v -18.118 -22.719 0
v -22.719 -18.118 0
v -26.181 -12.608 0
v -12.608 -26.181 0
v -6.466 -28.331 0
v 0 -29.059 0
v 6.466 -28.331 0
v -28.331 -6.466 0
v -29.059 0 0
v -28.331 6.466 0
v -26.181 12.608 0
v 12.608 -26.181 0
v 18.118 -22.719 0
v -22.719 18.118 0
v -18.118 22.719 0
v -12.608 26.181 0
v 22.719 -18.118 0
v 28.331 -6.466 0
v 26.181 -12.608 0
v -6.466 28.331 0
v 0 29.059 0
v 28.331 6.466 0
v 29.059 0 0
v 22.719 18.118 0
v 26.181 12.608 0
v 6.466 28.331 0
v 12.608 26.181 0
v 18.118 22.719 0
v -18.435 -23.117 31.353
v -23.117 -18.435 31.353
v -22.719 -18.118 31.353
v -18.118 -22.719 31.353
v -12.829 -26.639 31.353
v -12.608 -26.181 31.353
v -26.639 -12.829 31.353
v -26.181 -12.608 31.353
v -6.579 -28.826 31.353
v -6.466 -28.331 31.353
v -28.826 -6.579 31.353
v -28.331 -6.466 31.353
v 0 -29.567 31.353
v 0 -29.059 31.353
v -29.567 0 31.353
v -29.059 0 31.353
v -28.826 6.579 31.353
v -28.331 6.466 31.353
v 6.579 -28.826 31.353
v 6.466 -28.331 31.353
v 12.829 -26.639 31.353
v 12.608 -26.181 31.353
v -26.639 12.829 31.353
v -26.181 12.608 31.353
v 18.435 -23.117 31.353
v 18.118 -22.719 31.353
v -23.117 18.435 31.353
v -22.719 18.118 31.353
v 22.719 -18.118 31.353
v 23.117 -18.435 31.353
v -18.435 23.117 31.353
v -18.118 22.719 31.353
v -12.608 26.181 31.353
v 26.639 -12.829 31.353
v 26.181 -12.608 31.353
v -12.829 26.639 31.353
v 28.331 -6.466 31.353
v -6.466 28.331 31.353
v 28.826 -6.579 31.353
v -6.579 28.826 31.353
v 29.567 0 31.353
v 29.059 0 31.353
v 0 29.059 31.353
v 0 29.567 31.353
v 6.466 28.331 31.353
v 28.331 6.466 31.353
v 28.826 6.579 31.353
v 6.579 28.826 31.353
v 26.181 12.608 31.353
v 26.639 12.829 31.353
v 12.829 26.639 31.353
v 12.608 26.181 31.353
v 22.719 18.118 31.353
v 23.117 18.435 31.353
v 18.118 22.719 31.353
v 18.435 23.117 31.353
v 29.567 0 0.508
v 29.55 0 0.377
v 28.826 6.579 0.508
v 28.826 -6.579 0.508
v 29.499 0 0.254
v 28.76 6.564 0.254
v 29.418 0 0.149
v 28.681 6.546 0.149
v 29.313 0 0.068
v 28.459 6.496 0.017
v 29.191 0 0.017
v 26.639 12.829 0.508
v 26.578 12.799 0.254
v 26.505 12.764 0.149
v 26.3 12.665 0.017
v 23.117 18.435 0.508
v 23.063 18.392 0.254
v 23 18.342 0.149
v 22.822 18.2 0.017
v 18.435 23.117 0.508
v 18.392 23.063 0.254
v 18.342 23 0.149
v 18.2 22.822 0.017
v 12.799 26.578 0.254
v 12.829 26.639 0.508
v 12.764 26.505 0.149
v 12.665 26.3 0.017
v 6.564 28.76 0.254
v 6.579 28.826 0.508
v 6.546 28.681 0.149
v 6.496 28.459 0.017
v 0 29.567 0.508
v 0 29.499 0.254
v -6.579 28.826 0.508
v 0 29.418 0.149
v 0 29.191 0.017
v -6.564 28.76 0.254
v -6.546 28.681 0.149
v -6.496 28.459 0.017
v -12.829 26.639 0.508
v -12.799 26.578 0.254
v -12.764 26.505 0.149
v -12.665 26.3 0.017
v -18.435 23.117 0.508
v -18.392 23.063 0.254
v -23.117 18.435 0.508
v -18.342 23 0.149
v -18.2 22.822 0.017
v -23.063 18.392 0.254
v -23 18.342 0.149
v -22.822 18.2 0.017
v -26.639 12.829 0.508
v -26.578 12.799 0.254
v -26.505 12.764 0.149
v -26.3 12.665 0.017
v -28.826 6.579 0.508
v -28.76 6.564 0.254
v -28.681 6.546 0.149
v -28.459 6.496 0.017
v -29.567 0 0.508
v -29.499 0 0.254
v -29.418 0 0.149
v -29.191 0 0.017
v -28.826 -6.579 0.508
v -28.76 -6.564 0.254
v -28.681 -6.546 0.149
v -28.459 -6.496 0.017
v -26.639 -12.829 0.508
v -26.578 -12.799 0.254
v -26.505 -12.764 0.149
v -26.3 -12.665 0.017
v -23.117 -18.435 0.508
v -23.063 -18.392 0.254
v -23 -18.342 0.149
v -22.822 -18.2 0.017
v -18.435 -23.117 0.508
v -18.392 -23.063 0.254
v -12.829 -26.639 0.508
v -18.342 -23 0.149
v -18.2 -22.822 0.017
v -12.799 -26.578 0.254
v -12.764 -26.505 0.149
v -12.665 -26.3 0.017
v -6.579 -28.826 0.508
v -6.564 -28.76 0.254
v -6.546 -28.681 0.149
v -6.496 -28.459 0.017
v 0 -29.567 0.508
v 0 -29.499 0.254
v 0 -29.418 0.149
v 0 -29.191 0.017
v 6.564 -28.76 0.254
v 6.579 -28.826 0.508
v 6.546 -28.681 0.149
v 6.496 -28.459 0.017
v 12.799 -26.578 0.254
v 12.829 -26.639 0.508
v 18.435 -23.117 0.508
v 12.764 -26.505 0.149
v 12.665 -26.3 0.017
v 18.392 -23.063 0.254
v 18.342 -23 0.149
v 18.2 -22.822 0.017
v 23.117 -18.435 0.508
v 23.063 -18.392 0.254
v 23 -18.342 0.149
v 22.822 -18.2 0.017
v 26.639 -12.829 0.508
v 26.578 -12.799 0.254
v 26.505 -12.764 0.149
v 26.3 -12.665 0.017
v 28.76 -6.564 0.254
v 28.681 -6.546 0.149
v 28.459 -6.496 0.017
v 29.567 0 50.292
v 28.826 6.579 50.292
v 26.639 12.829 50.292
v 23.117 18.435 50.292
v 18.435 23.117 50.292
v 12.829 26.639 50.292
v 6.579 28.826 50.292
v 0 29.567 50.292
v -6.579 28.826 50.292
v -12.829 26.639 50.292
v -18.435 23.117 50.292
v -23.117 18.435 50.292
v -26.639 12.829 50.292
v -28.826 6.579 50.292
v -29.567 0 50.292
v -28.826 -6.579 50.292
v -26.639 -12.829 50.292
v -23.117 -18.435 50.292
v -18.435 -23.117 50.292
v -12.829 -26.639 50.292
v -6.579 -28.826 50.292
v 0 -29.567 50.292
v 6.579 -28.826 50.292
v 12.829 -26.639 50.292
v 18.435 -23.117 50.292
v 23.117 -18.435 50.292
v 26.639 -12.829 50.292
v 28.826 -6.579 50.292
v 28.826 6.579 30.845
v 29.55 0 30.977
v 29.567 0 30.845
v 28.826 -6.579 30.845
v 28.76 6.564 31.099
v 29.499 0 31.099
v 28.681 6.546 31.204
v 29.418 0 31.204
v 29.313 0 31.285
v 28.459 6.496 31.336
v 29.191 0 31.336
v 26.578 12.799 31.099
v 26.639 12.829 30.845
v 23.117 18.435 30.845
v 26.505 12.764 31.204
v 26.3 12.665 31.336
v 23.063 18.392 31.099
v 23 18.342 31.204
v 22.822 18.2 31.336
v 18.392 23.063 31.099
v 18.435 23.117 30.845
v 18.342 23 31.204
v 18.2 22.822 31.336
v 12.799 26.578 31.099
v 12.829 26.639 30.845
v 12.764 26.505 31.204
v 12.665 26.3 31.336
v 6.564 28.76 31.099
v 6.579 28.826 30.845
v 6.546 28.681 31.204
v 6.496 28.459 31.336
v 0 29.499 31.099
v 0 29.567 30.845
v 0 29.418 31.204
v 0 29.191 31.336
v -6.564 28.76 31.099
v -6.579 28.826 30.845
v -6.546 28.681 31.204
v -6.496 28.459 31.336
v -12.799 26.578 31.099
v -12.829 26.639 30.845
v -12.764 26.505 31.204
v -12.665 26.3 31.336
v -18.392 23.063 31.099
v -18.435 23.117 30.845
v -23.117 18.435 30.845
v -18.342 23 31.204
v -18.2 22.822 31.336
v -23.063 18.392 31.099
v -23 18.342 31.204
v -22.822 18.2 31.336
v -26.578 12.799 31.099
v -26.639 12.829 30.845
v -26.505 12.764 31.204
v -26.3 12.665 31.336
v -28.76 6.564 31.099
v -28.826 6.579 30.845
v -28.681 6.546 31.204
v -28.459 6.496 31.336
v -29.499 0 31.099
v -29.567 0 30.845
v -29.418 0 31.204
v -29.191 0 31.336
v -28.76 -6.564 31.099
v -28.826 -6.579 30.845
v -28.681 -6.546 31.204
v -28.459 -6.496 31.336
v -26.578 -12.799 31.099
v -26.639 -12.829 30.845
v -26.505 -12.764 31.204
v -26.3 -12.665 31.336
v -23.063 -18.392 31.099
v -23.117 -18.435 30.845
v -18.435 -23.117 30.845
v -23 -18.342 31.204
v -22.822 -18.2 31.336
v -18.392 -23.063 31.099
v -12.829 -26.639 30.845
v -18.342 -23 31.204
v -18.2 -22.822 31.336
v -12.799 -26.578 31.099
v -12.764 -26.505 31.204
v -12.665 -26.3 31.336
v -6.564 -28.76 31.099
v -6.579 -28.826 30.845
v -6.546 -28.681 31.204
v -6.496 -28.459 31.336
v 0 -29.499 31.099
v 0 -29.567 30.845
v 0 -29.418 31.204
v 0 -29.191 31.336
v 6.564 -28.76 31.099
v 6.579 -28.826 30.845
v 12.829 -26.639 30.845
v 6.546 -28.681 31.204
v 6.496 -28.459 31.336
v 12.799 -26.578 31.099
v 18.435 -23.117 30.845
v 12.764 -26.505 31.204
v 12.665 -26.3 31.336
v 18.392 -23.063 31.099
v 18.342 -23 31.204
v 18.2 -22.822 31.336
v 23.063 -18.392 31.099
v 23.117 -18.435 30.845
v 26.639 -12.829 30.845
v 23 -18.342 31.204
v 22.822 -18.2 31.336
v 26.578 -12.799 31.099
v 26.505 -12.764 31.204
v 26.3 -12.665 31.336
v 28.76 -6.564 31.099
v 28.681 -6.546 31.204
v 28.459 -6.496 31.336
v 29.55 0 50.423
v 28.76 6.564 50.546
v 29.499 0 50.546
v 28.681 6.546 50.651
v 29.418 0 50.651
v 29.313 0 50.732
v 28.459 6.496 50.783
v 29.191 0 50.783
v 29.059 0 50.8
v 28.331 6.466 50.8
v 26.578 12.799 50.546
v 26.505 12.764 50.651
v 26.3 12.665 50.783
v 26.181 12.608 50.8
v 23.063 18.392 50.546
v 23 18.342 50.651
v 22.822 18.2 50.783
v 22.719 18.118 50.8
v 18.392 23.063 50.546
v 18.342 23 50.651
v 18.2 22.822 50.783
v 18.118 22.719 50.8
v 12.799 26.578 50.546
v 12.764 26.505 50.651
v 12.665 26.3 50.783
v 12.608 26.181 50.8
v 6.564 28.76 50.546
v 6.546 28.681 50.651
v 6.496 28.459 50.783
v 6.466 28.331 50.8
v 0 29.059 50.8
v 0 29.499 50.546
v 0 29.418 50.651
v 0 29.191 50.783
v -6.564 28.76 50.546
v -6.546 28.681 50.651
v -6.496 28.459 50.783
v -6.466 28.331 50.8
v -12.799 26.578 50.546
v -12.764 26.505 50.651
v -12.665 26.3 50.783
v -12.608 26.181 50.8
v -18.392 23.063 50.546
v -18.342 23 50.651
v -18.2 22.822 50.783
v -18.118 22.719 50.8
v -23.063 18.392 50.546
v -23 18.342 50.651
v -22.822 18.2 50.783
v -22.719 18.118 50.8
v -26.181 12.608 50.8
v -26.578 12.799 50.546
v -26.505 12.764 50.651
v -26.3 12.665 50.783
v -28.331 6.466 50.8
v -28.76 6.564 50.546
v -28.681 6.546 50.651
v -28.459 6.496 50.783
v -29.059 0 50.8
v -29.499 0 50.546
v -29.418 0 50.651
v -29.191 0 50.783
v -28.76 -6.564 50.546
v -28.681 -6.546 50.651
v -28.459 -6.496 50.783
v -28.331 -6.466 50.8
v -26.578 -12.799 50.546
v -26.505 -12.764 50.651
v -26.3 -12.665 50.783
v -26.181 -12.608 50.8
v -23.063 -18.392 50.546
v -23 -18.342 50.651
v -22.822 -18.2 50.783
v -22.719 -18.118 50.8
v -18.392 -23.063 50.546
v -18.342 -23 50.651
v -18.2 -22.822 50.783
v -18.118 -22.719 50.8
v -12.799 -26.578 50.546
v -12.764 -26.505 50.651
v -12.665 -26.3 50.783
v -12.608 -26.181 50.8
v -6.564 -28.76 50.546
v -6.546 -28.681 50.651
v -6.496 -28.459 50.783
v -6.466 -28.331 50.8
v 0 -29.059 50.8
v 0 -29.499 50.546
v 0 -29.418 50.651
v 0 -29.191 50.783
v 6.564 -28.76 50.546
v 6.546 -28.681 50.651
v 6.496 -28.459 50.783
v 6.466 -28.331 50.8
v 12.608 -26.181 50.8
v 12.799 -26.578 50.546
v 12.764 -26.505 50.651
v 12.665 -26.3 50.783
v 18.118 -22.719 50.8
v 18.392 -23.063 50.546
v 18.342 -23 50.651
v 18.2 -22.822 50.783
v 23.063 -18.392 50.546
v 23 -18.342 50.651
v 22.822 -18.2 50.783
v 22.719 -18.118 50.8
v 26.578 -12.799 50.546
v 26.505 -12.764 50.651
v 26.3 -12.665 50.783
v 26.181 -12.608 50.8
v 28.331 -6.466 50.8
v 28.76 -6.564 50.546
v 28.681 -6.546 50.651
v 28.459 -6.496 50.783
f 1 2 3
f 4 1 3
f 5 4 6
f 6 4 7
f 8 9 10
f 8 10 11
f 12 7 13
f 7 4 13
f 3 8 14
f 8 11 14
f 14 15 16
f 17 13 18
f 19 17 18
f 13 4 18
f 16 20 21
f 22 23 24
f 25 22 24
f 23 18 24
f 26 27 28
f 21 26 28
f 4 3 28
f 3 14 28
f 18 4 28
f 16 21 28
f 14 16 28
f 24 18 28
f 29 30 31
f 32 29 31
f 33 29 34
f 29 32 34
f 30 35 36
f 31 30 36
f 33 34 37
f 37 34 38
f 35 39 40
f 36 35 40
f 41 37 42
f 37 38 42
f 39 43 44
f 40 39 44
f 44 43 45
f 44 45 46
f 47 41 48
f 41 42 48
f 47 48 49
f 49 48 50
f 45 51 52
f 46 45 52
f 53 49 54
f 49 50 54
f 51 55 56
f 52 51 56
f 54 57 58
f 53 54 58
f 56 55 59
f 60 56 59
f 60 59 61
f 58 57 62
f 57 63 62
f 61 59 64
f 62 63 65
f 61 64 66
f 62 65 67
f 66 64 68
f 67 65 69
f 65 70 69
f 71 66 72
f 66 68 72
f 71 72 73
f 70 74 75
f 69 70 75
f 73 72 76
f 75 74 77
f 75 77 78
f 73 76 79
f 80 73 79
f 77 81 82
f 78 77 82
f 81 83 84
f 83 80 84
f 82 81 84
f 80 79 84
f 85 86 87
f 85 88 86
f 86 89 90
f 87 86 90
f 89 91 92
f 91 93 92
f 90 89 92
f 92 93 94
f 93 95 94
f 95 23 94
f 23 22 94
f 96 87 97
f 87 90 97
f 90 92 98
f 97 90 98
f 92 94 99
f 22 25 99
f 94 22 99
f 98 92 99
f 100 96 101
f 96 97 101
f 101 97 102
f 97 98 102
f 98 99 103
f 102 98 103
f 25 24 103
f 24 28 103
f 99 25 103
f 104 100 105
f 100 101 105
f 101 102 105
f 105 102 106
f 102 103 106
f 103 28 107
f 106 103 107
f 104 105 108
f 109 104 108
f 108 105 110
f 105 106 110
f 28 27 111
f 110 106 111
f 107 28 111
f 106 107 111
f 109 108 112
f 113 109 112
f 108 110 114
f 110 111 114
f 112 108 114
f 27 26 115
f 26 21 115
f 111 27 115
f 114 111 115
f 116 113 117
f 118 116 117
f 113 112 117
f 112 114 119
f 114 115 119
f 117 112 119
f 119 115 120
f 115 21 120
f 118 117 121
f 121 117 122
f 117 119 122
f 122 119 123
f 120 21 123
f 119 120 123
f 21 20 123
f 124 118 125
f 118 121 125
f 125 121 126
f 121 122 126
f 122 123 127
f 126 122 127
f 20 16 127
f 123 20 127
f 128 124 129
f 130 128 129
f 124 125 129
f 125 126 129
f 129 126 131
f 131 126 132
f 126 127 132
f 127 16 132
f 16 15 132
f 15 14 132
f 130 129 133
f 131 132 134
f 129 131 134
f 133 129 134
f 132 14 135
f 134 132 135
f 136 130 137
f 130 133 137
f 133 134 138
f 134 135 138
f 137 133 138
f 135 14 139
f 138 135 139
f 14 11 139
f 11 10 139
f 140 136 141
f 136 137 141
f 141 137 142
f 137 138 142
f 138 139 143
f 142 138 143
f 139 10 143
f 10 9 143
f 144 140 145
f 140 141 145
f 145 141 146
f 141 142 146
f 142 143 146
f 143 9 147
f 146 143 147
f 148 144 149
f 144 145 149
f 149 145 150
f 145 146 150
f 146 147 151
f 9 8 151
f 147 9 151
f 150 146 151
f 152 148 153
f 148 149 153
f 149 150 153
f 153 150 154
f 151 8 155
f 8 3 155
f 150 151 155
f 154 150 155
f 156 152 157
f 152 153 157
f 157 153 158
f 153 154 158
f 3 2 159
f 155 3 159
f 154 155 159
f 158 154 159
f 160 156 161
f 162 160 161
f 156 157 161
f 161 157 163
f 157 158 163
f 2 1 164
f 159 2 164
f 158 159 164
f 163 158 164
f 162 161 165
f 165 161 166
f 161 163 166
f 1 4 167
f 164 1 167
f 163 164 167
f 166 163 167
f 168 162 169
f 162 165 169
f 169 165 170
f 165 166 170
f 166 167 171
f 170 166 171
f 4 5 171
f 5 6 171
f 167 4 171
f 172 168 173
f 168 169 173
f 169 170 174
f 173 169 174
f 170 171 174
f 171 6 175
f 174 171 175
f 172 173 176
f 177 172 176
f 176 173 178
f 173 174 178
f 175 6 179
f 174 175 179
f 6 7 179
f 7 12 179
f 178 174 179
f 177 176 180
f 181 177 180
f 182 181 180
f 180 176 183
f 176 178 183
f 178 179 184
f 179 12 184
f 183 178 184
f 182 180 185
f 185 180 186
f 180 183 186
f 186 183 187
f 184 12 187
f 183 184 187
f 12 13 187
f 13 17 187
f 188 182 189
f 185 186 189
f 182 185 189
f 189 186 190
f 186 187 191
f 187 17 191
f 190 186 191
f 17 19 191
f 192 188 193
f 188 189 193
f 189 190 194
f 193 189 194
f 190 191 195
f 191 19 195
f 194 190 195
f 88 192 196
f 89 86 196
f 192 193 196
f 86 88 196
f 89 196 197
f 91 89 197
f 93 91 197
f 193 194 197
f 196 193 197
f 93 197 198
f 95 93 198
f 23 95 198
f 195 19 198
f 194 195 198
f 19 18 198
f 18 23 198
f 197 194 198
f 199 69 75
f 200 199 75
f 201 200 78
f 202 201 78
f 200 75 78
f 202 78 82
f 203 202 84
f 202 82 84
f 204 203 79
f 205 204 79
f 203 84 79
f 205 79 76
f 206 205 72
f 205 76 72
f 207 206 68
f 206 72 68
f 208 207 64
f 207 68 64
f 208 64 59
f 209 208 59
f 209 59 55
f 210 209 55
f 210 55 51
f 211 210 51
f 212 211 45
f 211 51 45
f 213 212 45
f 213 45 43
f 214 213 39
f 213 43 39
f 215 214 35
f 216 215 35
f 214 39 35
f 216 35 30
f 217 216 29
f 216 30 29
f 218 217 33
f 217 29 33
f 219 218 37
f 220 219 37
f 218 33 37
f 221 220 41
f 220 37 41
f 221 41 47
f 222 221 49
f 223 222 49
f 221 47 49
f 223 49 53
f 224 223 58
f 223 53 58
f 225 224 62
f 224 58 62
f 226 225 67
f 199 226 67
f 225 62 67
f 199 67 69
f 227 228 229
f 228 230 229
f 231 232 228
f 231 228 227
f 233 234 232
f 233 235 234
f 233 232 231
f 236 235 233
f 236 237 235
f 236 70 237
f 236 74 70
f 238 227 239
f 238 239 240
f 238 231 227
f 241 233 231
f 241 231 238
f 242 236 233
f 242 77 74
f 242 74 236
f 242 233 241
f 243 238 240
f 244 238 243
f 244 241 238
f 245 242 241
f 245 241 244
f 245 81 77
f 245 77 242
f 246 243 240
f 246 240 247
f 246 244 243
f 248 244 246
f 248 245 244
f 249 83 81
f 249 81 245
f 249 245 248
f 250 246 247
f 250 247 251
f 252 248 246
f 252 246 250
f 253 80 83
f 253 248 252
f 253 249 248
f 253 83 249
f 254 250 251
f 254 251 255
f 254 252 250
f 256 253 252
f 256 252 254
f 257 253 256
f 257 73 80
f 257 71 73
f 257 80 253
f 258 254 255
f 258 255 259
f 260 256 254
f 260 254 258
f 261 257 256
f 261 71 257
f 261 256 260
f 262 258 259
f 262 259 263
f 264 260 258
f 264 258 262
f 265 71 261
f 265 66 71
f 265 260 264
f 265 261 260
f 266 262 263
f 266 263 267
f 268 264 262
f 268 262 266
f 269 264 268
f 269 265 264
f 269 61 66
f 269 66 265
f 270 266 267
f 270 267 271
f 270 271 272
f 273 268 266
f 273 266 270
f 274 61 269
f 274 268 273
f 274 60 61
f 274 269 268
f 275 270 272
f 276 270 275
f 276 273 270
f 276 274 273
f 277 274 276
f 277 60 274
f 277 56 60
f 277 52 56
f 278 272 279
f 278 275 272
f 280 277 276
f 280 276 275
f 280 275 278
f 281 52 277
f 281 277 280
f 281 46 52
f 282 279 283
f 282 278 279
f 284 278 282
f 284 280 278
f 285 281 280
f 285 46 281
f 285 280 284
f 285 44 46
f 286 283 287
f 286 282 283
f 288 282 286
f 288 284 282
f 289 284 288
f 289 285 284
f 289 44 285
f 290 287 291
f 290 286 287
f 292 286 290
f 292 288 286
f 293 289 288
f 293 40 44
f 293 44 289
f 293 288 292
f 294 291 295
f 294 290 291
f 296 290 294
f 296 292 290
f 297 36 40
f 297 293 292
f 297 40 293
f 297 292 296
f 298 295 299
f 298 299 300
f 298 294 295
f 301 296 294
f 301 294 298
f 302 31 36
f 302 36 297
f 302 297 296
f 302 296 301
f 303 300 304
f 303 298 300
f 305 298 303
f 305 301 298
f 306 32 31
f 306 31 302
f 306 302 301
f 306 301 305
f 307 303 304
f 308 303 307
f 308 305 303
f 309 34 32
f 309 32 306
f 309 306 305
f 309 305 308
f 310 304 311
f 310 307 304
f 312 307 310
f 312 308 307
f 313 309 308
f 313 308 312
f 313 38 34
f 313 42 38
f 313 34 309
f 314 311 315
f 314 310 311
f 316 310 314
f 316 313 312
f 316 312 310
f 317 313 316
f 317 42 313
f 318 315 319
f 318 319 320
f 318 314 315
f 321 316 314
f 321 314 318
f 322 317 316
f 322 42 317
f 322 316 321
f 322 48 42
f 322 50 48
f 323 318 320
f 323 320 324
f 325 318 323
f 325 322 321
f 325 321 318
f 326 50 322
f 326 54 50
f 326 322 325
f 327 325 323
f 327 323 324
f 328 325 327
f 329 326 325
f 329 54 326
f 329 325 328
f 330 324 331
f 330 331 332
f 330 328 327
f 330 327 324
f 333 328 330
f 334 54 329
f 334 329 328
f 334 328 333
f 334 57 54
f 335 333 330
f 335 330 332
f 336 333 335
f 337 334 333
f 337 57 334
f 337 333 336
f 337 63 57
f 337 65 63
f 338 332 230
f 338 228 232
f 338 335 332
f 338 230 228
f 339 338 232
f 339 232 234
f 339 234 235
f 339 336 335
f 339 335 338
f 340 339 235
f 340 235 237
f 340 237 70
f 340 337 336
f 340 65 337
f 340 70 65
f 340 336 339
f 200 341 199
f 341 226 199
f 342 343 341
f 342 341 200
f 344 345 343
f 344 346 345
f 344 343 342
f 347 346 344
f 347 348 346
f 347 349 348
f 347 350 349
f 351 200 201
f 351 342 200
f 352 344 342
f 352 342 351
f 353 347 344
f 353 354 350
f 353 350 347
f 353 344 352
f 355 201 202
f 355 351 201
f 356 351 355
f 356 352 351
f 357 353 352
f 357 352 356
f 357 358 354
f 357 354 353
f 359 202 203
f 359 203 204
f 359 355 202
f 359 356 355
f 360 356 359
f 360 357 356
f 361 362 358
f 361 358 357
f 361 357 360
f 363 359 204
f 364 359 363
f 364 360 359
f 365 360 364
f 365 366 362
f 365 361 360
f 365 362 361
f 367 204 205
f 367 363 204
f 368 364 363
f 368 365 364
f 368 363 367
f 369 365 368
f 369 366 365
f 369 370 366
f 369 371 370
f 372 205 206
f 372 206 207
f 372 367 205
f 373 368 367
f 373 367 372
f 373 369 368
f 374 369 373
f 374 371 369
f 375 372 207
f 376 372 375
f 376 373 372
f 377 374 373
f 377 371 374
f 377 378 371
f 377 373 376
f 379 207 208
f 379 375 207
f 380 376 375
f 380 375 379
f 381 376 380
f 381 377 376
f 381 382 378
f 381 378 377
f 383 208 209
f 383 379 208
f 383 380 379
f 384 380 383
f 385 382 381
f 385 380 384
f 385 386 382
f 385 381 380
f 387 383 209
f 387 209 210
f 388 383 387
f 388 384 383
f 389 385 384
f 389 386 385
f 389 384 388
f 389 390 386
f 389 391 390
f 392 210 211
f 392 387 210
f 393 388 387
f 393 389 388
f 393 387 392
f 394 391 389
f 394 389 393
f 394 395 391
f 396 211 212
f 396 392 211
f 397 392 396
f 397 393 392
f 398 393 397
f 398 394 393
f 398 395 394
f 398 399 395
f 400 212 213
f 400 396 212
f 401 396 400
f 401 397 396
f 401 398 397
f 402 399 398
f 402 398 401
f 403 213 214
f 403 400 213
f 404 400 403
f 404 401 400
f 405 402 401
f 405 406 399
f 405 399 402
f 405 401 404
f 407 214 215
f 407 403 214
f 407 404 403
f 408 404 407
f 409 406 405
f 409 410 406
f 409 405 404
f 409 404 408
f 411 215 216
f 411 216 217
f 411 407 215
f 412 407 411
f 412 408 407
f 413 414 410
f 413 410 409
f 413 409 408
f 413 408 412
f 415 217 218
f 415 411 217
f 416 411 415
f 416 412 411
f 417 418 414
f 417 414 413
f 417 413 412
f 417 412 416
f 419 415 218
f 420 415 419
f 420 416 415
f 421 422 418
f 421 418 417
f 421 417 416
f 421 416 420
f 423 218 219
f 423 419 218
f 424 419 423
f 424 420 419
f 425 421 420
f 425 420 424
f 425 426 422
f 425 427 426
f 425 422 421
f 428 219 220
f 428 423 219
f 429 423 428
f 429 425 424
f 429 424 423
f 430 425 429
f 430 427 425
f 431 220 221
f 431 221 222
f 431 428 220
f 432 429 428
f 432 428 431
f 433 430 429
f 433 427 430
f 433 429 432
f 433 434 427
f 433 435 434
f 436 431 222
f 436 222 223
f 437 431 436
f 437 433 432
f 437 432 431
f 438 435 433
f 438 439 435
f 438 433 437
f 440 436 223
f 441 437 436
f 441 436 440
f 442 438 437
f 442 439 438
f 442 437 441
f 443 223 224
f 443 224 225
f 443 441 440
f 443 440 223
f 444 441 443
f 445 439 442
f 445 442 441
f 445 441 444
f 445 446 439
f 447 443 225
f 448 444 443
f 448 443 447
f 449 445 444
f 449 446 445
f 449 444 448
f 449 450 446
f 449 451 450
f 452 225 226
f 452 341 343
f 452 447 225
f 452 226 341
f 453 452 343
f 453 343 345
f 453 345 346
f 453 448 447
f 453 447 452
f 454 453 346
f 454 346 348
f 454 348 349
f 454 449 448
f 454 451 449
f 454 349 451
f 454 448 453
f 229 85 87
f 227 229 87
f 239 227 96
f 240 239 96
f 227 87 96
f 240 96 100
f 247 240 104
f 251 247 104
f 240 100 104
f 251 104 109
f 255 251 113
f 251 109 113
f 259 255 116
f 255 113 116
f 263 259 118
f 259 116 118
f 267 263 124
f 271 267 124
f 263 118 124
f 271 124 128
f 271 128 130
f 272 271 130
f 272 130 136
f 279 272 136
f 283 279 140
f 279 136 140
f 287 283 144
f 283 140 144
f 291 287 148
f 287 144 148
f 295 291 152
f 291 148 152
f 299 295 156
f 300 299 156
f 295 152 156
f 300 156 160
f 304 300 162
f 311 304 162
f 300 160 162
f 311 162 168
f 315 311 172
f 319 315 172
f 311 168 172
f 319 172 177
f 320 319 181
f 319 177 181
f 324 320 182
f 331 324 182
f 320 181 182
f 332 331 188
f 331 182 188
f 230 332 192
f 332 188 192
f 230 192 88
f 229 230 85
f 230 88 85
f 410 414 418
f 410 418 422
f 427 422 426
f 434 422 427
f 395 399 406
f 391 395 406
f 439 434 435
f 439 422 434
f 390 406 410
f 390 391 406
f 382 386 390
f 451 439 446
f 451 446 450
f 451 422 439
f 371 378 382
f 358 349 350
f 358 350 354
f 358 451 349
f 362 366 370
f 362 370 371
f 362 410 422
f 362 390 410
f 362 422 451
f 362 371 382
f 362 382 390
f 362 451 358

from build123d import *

# Parameters (mm, degrees)
F0_R     = 29.567188
F1_DEPTH = 31.353125
F2_R     = 0.508
F3_R     = 29.567188
F4_DEPTH = 19.446875
F5_R     = 0.508


with BuildPart() as f1:
    # F0 (on Top) → F1 (new body)
    with BuildSketch(Plane.XY):
        Circle(F0_R)
    extrude(amount=F1_DEPTH)

    # F2
    f2_edges = [f1.edges().sort_by_distance(p)[0] for p in [
        (-29.567188, 0, 0),
        (-29.567188, 0, 31.353125),
    ]]
    fillet(f2_edges, radius=F2_R)

    # F3 (on face) → F4 (join)
    with BuildSketch(Plane.XY.offset(31.353125)):
        Circle(F3_R)
    extrude(amount=F4_DEPTH)

    # F5
    f5_edges = [f1.edges().sort_by_distance(p)[0] for p in [
        (-29.567188, 0, 50.8),
    ]]
    fillet(f5_edges, radius=F5_R)


solid = f1.part
